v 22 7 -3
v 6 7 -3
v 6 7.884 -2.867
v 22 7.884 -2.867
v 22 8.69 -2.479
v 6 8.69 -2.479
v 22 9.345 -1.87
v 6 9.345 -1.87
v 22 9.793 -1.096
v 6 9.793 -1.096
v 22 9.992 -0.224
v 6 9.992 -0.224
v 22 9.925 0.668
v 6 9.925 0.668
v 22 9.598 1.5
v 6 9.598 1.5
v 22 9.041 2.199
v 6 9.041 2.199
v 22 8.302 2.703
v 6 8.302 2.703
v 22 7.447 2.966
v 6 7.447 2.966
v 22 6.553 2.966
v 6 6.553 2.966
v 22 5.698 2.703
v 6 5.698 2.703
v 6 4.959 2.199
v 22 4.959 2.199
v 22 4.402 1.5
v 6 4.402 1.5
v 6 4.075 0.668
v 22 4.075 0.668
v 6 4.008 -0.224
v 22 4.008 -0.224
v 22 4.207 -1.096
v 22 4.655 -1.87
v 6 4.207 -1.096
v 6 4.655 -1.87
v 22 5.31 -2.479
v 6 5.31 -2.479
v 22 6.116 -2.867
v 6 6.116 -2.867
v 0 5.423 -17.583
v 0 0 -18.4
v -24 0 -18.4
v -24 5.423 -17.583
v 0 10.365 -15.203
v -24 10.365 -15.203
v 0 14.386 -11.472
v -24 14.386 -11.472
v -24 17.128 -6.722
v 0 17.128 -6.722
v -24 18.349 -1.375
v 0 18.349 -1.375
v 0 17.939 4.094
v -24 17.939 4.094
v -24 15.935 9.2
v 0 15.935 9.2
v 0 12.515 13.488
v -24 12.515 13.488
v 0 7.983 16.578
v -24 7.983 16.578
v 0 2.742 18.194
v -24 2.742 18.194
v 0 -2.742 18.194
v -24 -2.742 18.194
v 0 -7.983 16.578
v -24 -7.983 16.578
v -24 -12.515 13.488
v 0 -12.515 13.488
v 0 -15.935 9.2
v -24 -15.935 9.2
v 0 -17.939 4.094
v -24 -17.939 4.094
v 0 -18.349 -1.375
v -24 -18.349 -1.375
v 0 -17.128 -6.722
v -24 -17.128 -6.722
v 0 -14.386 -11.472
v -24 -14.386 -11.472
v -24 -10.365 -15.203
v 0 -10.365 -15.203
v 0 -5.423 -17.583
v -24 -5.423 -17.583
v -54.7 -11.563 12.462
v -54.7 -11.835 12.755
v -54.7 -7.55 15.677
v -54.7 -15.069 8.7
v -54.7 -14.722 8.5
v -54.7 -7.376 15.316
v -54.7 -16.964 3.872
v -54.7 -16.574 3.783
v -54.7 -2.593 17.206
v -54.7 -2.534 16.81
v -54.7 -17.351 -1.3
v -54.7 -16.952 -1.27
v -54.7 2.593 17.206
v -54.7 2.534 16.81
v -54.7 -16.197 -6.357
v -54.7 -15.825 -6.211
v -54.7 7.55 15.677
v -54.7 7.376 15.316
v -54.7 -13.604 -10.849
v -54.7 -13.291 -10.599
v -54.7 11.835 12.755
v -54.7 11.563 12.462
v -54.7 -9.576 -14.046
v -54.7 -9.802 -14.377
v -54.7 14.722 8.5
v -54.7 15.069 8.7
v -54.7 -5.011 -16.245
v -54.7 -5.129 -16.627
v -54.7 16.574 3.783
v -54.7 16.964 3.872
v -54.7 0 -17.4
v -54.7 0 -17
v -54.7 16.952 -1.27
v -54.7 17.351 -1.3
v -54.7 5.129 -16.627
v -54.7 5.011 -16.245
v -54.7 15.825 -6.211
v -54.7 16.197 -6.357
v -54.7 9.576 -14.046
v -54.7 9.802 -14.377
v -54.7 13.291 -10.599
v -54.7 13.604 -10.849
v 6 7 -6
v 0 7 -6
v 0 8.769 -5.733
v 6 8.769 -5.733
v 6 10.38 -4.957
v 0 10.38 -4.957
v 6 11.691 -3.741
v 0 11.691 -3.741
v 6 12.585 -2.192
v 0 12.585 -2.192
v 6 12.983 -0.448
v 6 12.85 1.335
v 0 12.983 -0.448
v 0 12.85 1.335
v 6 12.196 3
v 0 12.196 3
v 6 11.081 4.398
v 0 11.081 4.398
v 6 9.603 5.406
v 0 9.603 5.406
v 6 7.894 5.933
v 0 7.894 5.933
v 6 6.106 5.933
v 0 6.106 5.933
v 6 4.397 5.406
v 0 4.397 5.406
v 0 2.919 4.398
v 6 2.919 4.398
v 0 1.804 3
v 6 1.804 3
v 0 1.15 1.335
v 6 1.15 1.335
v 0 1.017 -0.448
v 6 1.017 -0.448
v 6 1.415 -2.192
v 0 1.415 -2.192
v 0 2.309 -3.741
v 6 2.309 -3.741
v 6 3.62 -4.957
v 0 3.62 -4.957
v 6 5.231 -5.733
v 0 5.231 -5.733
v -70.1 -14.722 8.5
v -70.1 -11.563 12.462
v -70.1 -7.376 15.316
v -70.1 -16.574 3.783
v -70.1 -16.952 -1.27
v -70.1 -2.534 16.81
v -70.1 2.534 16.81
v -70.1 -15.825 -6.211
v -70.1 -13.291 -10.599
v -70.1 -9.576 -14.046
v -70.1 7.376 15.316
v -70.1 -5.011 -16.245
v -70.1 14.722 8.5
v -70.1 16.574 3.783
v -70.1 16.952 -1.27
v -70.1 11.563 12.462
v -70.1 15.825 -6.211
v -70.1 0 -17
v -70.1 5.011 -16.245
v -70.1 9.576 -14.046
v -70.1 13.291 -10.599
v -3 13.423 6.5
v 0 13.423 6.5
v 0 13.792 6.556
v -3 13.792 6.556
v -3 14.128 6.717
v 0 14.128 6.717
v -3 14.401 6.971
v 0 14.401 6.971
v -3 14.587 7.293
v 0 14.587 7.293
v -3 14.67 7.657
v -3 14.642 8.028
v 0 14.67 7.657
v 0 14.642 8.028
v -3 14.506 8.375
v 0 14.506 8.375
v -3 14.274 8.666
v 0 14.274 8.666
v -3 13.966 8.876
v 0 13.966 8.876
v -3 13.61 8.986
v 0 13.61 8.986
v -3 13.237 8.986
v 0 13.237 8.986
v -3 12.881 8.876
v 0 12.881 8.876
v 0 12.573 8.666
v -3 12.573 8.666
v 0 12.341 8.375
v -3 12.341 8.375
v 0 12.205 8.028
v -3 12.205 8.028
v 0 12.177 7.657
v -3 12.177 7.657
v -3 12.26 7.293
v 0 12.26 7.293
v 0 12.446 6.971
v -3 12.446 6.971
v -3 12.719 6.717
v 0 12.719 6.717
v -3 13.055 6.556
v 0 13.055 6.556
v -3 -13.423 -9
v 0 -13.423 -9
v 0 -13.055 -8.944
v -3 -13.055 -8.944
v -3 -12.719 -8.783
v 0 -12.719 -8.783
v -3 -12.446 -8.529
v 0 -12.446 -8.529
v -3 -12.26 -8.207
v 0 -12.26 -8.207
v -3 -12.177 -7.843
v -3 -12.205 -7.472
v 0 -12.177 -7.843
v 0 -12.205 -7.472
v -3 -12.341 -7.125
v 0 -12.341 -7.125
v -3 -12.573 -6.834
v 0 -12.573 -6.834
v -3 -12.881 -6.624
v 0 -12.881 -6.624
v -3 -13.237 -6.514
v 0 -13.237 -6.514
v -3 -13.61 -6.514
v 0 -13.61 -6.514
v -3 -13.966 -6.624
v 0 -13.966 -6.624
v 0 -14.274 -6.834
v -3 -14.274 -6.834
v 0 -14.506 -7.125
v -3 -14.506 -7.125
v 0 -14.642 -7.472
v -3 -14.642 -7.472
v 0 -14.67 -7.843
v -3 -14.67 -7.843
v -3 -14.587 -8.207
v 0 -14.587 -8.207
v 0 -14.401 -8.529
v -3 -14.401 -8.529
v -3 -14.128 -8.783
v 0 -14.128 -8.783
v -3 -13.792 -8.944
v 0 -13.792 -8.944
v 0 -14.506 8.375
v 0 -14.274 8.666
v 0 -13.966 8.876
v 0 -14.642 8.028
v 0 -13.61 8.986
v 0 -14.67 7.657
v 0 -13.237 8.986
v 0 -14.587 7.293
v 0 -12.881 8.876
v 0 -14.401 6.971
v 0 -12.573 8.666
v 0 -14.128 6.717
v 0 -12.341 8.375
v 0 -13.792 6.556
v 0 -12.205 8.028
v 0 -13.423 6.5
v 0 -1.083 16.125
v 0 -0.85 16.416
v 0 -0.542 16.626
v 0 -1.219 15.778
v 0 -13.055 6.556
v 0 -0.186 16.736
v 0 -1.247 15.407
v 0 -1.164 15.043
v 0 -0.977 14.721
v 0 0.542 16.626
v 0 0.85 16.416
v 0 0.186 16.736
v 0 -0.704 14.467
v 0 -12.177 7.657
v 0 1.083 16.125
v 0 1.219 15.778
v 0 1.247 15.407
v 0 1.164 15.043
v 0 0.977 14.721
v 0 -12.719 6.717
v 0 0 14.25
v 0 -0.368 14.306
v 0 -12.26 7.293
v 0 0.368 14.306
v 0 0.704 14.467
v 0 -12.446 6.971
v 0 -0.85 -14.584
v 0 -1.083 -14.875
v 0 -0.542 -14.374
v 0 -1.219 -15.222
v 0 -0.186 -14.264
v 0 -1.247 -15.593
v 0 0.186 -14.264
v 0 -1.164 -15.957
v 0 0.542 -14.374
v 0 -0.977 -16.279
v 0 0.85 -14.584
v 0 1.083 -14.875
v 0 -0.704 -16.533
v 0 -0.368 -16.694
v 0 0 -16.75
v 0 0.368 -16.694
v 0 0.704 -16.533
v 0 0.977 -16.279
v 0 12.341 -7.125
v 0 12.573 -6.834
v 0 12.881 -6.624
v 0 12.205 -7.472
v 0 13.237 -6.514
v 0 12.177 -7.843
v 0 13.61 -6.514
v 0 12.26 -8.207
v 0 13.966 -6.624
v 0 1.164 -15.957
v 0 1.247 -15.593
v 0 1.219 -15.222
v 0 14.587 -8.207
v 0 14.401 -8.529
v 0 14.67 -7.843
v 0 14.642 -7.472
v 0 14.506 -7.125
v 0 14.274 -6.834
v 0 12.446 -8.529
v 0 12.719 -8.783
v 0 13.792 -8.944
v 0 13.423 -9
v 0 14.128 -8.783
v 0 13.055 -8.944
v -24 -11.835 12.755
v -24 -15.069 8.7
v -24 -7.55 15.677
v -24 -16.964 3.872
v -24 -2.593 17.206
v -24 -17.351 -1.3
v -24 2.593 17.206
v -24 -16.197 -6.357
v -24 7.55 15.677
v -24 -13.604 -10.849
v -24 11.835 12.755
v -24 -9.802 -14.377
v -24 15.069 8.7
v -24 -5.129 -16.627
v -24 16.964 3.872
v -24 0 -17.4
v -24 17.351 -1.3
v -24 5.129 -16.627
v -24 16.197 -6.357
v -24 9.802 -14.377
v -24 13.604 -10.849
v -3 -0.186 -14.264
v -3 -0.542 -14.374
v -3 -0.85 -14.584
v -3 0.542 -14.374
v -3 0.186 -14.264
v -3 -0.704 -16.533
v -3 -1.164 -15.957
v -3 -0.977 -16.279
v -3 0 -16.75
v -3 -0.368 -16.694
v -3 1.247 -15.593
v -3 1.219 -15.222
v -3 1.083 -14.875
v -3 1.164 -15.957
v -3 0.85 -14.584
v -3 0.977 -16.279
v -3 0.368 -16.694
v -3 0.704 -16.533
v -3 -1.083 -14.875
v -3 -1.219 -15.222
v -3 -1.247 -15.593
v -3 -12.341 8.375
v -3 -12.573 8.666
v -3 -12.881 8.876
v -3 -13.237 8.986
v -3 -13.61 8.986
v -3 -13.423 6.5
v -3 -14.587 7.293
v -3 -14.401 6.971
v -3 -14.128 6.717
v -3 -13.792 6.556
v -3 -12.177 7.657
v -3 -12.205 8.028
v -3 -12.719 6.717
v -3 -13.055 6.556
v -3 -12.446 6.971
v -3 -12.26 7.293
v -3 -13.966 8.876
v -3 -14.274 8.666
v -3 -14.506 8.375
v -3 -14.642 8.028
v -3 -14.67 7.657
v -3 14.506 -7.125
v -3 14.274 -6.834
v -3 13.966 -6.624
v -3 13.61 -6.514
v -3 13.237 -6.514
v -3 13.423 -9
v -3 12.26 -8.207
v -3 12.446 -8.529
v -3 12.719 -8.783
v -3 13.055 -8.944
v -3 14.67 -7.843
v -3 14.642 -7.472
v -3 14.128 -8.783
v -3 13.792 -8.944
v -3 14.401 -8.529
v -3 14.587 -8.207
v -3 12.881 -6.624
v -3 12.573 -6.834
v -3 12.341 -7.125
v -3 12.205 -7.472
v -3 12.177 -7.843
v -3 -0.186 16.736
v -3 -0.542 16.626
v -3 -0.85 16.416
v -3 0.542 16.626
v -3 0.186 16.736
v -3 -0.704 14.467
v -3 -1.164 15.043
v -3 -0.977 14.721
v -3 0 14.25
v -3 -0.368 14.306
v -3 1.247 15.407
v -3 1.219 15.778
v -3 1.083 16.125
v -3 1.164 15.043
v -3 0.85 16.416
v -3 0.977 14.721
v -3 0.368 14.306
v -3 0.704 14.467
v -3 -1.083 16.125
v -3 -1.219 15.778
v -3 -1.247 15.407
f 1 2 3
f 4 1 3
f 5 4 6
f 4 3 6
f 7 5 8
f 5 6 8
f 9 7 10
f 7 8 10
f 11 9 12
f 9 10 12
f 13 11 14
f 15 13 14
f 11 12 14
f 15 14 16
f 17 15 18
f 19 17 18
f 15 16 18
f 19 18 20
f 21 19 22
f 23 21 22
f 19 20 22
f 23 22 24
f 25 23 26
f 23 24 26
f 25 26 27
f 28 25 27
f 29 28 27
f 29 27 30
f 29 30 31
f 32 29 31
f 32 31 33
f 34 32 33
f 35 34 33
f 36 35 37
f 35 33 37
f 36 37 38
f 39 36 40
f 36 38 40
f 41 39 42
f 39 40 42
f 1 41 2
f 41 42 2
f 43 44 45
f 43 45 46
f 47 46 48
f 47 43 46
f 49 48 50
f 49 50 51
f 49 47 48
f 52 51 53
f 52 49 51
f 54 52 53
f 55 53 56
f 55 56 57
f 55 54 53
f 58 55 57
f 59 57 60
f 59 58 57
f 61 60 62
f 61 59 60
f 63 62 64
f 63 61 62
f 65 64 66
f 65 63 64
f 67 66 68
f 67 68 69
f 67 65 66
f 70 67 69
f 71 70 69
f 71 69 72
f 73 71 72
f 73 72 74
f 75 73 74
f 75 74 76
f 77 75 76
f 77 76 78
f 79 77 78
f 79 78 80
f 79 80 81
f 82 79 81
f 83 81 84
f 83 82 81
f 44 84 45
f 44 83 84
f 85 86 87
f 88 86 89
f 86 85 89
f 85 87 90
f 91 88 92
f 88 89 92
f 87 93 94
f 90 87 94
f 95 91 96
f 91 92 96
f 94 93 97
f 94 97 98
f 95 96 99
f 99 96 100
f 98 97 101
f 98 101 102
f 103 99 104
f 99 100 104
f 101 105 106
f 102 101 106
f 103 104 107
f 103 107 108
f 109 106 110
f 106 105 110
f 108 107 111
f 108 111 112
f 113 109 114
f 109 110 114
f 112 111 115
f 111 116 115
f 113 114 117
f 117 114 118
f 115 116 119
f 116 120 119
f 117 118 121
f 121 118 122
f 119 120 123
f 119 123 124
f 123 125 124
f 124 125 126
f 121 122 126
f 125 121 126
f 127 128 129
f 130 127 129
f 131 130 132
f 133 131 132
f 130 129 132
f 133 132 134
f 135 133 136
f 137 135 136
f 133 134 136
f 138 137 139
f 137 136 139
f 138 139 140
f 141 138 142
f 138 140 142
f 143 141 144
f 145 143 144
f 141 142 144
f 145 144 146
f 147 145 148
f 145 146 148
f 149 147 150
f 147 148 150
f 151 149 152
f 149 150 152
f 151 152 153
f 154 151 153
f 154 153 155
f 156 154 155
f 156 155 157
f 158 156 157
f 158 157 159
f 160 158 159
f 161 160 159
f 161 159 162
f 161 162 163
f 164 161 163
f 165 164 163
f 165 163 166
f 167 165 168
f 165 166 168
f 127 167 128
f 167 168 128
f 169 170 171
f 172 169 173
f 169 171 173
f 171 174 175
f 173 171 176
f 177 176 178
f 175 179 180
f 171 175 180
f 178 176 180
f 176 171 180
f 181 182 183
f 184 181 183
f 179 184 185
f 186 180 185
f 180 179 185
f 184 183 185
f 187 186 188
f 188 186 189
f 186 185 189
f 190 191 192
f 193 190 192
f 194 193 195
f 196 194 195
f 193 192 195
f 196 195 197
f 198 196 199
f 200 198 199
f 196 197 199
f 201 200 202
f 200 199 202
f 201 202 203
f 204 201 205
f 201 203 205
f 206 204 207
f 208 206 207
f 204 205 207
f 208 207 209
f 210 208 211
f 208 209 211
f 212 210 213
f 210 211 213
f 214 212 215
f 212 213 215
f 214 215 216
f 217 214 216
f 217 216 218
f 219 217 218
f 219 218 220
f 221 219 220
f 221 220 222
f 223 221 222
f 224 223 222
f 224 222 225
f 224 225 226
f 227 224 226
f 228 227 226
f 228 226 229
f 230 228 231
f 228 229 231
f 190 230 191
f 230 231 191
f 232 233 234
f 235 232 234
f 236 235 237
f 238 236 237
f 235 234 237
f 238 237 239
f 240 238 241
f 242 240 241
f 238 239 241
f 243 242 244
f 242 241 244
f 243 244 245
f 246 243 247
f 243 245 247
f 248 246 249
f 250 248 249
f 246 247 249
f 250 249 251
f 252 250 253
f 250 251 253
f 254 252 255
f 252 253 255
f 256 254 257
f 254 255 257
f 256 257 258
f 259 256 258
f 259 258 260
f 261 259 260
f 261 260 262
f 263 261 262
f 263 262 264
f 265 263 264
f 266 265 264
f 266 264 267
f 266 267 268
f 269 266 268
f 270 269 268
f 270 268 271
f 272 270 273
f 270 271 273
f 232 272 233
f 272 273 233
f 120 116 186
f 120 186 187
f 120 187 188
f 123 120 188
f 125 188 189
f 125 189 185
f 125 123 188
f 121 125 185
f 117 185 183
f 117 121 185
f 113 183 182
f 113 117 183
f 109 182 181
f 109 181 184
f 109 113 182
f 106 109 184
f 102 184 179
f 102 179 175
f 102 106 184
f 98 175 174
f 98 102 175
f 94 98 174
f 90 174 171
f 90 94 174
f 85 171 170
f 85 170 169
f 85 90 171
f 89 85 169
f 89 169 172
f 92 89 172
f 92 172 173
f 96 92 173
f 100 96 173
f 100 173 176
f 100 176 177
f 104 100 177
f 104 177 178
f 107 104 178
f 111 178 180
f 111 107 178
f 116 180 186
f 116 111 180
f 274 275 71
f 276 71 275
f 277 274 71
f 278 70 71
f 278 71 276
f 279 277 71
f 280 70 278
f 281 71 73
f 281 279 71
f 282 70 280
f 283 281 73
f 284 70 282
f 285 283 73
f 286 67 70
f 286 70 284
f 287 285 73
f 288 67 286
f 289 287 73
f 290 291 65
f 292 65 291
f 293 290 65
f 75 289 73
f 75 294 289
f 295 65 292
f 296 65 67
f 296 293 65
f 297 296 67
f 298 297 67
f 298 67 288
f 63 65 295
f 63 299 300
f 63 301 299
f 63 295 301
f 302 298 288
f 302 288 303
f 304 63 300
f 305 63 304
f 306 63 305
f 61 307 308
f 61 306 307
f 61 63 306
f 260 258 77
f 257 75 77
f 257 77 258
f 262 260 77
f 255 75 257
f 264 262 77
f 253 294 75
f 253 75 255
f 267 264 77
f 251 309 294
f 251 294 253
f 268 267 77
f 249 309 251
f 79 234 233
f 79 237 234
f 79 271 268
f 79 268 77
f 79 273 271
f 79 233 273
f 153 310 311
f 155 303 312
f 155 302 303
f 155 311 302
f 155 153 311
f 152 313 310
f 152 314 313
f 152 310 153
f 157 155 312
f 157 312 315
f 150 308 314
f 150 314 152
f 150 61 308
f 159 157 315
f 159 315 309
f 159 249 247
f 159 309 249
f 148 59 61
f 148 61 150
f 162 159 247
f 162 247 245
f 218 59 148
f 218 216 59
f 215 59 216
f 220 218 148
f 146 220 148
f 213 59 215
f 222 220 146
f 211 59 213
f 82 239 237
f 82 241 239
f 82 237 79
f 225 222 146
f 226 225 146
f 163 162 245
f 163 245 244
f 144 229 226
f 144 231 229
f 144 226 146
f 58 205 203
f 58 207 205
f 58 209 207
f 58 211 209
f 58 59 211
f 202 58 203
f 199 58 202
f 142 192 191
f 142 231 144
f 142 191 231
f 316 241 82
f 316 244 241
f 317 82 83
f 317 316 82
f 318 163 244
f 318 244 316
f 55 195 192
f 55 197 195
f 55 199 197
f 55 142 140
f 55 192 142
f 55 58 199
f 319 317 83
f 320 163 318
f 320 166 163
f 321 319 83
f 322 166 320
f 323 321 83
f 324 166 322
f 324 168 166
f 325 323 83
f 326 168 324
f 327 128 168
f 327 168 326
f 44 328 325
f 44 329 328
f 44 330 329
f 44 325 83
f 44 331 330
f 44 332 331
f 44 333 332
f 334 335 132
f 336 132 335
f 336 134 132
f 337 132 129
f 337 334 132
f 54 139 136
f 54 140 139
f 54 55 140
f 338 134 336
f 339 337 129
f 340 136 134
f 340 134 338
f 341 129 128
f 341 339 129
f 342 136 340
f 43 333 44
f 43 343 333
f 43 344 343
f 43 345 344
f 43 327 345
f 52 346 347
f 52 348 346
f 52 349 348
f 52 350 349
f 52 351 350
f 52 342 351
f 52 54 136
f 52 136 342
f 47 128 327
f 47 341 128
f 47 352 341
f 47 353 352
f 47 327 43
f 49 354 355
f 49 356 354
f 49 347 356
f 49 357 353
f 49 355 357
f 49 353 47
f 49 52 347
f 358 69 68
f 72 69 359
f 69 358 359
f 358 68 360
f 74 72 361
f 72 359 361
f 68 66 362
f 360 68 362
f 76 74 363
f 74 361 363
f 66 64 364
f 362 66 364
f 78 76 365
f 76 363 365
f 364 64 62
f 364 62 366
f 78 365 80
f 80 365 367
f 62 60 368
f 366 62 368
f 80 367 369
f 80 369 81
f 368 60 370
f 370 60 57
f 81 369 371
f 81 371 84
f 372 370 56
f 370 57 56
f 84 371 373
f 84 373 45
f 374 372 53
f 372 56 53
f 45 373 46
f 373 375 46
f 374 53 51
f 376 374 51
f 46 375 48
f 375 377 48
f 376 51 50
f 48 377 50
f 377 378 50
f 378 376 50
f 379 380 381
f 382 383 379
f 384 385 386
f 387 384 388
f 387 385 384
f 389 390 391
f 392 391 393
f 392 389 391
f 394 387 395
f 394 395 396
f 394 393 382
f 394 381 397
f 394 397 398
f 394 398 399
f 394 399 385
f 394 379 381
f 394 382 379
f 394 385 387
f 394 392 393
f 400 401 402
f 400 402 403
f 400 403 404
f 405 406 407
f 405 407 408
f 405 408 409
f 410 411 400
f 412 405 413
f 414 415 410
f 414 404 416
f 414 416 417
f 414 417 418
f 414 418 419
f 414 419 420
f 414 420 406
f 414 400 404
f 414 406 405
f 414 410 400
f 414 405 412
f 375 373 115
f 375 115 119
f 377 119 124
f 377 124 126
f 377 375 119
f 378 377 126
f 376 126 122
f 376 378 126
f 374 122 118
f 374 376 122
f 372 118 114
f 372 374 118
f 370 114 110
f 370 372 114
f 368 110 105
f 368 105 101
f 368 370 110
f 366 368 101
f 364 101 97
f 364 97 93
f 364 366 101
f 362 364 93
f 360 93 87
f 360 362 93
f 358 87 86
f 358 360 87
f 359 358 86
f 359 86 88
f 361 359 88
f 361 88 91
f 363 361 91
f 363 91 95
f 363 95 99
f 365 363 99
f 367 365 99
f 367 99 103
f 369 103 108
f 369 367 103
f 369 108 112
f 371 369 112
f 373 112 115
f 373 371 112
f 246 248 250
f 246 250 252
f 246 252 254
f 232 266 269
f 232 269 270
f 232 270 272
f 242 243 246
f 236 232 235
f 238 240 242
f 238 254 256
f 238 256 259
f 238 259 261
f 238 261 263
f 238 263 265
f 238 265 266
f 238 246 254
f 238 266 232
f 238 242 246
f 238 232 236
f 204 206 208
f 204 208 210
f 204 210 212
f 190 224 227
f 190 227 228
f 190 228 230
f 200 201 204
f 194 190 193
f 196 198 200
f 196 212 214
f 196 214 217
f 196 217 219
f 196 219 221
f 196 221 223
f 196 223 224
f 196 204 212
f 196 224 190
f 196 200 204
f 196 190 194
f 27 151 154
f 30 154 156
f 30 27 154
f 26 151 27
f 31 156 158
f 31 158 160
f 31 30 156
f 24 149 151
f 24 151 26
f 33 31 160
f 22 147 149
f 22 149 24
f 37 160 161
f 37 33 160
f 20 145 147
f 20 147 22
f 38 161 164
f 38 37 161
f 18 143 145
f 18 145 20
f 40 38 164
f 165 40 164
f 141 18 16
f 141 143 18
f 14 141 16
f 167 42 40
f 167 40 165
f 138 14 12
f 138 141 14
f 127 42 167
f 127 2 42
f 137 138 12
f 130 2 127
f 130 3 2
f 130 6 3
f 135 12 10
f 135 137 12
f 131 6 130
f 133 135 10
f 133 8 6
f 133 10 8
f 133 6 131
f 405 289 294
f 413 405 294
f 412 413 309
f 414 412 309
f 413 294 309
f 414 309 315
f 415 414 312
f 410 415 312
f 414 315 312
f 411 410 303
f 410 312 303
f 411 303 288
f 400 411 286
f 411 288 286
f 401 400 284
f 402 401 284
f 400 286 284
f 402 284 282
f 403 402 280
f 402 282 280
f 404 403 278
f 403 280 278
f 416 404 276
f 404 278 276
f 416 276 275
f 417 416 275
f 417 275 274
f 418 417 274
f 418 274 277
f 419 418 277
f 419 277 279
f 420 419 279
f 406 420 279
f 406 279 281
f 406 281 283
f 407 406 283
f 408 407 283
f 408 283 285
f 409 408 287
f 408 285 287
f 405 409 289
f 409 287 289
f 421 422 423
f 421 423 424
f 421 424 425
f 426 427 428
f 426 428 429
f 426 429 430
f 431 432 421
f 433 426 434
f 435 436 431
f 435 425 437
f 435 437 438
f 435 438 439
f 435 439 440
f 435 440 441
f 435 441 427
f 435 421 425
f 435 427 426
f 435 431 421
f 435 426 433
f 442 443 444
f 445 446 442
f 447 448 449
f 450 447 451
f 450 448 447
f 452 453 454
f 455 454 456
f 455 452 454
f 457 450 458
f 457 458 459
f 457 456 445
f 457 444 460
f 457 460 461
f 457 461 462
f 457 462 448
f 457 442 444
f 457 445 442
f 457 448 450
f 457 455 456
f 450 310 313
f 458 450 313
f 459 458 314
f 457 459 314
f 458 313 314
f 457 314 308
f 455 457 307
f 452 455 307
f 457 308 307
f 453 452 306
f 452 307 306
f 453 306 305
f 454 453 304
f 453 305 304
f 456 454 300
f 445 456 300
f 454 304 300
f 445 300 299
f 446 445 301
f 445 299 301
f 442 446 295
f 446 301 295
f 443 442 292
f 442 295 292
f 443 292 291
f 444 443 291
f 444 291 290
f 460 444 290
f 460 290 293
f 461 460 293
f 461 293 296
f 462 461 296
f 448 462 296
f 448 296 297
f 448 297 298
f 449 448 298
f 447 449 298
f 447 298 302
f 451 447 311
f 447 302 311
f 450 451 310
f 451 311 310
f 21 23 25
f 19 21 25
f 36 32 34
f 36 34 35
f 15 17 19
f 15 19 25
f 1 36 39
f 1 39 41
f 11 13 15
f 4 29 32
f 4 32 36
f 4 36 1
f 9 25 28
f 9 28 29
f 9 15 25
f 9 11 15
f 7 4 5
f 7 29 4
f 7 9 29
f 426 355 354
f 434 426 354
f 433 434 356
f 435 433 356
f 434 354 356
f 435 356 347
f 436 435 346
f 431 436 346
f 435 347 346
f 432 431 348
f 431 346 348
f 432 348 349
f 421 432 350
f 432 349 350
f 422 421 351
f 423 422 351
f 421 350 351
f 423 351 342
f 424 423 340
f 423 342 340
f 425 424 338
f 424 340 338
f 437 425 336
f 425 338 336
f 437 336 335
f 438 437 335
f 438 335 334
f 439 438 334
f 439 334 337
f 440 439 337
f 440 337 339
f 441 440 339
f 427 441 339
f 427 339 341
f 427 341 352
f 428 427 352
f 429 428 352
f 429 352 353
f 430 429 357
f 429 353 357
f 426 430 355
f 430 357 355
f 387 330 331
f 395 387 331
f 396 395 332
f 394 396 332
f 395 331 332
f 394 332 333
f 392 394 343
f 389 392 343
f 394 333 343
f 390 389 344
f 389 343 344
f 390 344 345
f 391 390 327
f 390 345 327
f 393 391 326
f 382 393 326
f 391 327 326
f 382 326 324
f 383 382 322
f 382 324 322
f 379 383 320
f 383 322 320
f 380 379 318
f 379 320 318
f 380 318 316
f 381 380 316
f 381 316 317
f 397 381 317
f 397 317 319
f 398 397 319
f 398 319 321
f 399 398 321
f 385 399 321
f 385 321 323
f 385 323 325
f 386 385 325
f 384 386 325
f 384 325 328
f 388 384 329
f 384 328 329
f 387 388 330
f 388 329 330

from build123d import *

# Parameters (mm, degrees)
SK_GEARBOX_R              = 18.4
EX_GEARBOX_DEPTH          = 24
SK_MOTOR_R                = 17.4
EX_MOTOR_DEPTH            = 30.7
SK_ENCODER_R              = 17
EX_ENCODER_DEPTH          = 15.4
SK_BUSHING_R              = 6
EX_BUSHING_DEPTH          = 6
SK_SHAFT_R                = 3
EX_SHAFT_DEPTH            = 16
SK_MOUNTHOLES_6XM3_R      = 1.25
CUT_MOUNTHOLES_6XM3_DEPTH = 3


with BuildPart() as part:
    # SK_Gearbox → EX_Gearbox (new body)
    with BuildSketch(Plane(origin=(0, 0, 0), x_dir=(0, 0, -1), z_dir=(1, 0, 0))):
        Circle(SK_GEARBOX_R)
    extrude(amount=-EX_GEARBOX_DEPTH)

    # SK_Motor → EX_Motor (add)
    with BuildSketch(Plane(origin=(-24, 0, 0), x_dir=(0, 0, -1), z_dir=(1, 0, 0))):
        Circle(SK_MOTOR_R)
    extrude(amount=-EX_MOTOR_DEPTH)

    # SK_Encoder → EX_Encoder (add)
    with BuildSketch(Plane(origin=(-54.7, 0, 0), x_dir=(0, 0, -1), z_dir=(1, 0, 0))):
        Circle(SK_ENCODER_R)
    extrude(amount=-EX_ENCODER_DEPTH)

    # SK_Bushing → EX_Bushing (add)
    with BuildSketch(Plane(origin=(0, 0, 0), x_dir=(0, 0, -1), z_dir=(1, 0, 0))):
        with Locations((0, 7)):
            Circle(SK_BUSHING_R)
    extrude(amount=EX_BUSHING_DEPTH)

    # SK_Shaft → EX_Shaft (add)
    with BuildSketch(Plane(origin=(6, 0, 0), x_dir=(0, 0, -1), z_dir=(1, 0, 0))):
        with Locations((0, 7)):
            Circle(SK_SHAFT_R)
    extrude(amount=EX_SHAFT_DEPTH)

    # SK_MountHoles_6xM3 → CUT_MountHoles_6xM3 (cut)
    with BuildSketch(Plane(origin=(0, 0, 0), x_dir=(0, 0, -1), z_dir=(1, 0, 0))):
        with Locations((-15.5, 0)):
            Circle(SK_MOUNTHOLES_6XM3_R)
        with Locations((-7.75, 13.423393759)):
            Circle(SK_MOUNTHOLES_6XM3_R)
        with Locations((7.75, 13.423393759)):
            Circle(SK_MOUNTHOLES_6XM3_R)
        with Locations((15.5, 0)):
            Circle(SK_MOUNTHOLES_6XM3_R)
        with Locations((7.75, -13.423393759)):
            Circle(SK_MOUNTHOLES_6XM3_R)
        with Locations((-7.75, -13.423393759)):
            Circle(SK_MOUNTHOLES_6XM3_R)
    extrude(amount=-CUT_MOUNTHOLES_6XM3_DEPTH, mode=Mode.SUBTRACT)


solid = part.part
